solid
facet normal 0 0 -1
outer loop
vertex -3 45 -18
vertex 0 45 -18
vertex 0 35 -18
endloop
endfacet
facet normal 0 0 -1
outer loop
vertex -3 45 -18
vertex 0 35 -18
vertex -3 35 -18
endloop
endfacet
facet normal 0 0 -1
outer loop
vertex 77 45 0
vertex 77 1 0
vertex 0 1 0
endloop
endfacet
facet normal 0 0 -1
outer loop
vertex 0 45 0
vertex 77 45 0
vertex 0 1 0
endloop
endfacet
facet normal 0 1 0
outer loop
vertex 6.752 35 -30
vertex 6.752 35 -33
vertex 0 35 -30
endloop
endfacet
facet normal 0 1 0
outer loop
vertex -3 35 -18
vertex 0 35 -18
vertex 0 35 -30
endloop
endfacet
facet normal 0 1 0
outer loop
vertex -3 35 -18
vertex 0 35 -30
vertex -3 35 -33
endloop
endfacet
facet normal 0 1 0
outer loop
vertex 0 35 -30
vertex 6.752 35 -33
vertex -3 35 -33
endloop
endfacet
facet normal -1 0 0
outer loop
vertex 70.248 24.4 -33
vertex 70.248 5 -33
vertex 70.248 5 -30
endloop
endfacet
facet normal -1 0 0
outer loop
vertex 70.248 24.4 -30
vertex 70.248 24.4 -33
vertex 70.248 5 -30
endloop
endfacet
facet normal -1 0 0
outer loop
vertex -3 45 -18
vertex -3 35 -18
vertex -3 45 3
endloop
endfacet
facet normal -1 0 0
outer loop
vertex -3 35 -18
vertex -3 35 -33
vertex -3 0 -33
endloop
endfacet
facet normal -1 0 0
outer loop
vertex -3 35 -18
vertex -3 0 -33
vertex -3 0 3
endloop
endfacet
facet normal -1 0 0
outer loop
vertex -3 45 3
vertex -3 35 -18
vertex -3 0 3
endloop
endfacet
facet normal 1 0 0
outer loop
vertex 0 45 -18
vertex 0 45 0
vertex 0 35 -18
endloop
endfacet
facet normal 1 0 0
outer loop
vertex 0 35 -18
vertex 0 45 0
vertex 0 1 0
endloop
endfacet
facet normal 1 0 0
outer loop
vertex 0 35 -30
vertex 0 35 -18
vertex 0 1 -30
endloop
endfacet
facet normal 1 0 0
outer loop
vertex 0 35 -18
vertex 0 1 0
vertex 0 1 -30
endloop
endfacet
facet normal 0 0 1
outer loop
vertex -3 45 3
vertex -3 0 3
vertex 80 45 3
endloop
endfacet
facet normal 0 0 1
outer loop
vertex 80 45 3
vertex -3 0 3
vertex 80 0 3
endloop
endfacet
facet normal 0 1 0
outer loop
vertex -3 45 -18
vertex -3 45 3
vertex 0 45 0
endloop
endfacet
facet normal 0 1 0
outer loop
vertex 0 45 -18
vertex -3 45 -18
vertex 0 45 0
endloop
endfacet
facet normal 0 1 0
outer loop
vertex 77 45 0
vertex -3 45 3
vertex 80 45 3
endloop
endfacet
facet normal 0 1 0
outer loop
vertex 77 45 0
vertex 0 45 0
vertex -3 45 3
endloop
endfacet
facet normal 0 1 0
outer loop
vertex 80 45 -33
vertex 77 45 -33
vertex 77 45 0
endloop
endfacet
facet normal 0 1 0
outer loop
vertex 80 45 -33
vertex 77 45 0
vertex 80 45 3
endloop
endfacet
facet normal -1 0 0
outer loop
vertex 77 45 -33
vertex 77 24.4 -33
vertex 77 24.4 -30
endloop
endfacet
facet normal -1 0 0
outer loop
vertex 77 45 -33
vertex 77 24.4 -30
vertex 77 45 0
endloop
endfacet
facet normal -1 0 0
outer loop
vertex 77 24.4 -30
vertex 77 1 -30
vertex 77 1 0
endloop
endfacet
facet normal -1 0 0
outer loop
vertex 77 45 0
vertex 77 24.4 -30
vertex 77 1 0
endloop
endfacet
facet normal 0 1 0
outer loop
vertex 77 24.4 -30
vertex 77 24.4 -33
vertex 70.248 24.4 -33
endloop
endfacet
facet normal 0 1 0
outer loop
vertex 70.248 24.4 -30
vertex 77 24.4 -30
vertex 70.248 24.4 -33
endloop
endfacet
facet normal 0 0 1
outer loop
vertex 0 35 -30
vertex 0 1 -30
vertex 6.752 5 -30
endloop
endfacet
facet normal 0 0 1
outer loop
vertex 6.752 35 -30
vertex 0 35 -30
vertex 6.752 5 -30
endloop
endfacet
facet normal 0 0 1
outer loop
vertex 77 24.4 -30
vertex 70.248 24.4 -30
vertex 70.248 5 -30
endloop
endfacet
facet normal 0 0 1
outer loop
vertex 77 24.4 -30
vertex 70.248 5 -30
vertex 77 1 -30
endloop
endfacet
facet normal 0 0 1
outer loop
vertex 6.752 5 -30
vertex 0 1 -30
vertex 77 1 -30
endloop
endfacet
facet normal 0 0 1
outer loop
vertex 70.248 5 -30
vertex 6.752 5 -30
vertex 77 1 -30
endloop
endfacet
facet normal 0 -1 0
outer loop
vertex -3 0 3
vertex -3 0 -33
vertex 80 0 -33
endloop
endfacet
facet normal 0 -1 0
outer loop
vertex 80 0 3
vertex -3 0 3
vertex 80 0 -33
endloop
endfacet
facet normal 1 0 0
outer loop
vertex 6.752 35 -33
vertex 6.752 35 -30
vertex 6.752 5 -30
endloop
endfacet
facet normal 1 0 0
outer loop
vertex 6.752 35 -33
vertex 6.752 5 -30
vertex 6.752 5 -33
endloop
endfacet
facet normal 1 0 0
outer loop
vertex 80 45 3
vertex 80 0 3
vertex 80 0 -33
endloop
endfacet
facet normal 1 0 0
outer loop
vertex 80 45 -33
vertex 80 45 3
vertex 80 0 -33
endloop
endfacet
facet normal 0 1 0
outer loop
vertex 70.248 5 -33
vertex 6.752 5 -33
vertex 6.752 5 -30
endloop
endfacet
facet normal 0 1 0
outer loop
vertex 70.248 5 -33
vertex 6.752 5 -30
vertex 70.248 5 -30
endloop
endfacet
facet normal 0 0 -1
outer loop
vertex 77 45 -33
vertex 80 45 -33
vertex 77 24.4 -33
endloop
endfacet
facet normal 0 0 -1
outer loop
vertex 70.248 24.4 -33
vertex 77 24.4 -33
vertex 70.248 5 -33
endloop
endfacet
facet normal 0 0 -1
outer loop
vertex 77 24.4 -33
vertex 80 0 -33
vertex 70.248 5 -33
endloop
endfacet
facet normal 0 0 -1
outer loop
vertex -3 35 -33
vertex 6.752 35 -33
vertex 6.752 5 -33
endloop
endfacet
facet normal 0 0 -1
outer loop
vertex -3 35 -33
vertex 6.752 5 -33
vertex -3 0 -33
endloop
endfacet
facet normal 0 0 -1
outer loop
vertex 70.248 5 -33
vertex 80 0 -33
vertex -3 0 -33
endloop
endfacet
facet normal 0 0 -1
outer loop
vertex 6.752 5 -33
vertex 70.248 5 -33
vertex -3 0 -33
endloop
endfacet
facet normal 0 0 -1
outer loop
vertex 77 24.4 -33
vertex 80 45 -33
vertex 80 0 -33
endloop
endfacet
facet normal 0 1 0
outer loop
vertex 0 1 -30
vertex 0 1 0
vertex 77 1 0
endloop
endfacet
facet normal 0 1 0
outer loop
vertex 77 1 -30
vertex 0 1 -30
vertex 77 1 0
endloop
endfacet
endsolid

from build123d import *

# Parameters (mm, degrees)
SKETCH1_W           = 83
SKETCH1_H           = 36
SKETCH1_W_2         = 77
SKETCH1_H_2         = 30
BOSS_EXTRUDE1_DEPTH = 5
BOSS_EXTRUDE2_DEPTH = 40
SKETCH3_W           = 83
SKETCH3_H           = 36
BOSS_EXTRUDE3_DEPTH = 1
SKETCH4_W           = 9.752325518
SKETCH4_H           = 10
CUT_EXTRUDE1_DEPTH  = 15
CUT_EXTRUDE2_REACH  = 100.595
SKETCH5_W           = 7.400592898
SKETCH5_H           = 21.28859468


with BuildPart() as part:
    # Sketch1 → Boss-Extrude1 (new body)
    with BuildSketch(Plane(origin=(0, 0, 0), x_dir=(1, 0, 0), z_dir=(0, 1, 0))):
        with Locations((38.5, 15)):
            Rectangle(SKETCH1_W, SKETCH1_H)
        with Locations((38.5, 15)):
            Rectangle(SKETCH1_W_2, SKETCH1_H_2, mode=Mode.SUBTRACT)
    extrude(amount=BOSS_EXTRUDE1_DEPTH)

    # Sketch2 → Boss-Extrude2 (add)
    with BuildSketch(Plane(origin=(0, 5, 0), x_dir=(1, 0, 0), z_dir=(0, 1, 0))):
        Polygon((80, -3), (80, 33), (70.247674482, 33), (70.247674482, 30), (77, 30), (77, 0), (0, 0), (0, 30), (6.752325518, 30), (6.752325518, 33), (-3, 33), (-3, -3), align=None)
    extrude(amount=BOSS_EXTRUDE2_DEPTH)

    # Sketch3 → Boss-Extrude3 (add)
    with BuildSketch(Plane.XZ):
        with Locations((38.5, -15)):
            Rectangle(SKETCH3_W, SKETCH3_H)
    extrude(amount=-BOSS_EXTRUDE3_DEPTH)

    # Sketch4 → Cut-Extrude1 (cut)
    with BuildSketch(Plane(origin=(0, 0, -33), x_dir=(-1, 0, 0), z_dir=(0, 0, -1))):
        with Locations((-1.876162759, 40)):
            Rectangle(SKETCH4_W, SKETCH4_H)
    extrude(amount=-CUT_EXTRUDE1_DEPTH, mode=Mode.SUBTRACT)

    # Sketch5 → Cut-Extrude2 (cut, up to next)
    with BuildSketch(Plane(origin=(0, 0, -33), x_dir=(-1, 0, 0), z_dir=(0, 0, -1)), mode=Mode.PRIVATE) as cut_extrude2_sk1:
        with Locations((-73.299703551, 35.04429734)):
            Rectangle(SKETCH5_W, SKETCH5_H)
    cut_extrude2_tool1 = extrude(cut_extrude2_sk1.sketch, amount=-CUT_EXTRUDE2_REACH, mode=Mode.PRIVATE) & part.part
    add(cut_extrude2_tool1.solids().sort_by_distance((73.299704, 35.044297, -33))[0], mode=Mode.SUBTRACT)


solid = part.part
